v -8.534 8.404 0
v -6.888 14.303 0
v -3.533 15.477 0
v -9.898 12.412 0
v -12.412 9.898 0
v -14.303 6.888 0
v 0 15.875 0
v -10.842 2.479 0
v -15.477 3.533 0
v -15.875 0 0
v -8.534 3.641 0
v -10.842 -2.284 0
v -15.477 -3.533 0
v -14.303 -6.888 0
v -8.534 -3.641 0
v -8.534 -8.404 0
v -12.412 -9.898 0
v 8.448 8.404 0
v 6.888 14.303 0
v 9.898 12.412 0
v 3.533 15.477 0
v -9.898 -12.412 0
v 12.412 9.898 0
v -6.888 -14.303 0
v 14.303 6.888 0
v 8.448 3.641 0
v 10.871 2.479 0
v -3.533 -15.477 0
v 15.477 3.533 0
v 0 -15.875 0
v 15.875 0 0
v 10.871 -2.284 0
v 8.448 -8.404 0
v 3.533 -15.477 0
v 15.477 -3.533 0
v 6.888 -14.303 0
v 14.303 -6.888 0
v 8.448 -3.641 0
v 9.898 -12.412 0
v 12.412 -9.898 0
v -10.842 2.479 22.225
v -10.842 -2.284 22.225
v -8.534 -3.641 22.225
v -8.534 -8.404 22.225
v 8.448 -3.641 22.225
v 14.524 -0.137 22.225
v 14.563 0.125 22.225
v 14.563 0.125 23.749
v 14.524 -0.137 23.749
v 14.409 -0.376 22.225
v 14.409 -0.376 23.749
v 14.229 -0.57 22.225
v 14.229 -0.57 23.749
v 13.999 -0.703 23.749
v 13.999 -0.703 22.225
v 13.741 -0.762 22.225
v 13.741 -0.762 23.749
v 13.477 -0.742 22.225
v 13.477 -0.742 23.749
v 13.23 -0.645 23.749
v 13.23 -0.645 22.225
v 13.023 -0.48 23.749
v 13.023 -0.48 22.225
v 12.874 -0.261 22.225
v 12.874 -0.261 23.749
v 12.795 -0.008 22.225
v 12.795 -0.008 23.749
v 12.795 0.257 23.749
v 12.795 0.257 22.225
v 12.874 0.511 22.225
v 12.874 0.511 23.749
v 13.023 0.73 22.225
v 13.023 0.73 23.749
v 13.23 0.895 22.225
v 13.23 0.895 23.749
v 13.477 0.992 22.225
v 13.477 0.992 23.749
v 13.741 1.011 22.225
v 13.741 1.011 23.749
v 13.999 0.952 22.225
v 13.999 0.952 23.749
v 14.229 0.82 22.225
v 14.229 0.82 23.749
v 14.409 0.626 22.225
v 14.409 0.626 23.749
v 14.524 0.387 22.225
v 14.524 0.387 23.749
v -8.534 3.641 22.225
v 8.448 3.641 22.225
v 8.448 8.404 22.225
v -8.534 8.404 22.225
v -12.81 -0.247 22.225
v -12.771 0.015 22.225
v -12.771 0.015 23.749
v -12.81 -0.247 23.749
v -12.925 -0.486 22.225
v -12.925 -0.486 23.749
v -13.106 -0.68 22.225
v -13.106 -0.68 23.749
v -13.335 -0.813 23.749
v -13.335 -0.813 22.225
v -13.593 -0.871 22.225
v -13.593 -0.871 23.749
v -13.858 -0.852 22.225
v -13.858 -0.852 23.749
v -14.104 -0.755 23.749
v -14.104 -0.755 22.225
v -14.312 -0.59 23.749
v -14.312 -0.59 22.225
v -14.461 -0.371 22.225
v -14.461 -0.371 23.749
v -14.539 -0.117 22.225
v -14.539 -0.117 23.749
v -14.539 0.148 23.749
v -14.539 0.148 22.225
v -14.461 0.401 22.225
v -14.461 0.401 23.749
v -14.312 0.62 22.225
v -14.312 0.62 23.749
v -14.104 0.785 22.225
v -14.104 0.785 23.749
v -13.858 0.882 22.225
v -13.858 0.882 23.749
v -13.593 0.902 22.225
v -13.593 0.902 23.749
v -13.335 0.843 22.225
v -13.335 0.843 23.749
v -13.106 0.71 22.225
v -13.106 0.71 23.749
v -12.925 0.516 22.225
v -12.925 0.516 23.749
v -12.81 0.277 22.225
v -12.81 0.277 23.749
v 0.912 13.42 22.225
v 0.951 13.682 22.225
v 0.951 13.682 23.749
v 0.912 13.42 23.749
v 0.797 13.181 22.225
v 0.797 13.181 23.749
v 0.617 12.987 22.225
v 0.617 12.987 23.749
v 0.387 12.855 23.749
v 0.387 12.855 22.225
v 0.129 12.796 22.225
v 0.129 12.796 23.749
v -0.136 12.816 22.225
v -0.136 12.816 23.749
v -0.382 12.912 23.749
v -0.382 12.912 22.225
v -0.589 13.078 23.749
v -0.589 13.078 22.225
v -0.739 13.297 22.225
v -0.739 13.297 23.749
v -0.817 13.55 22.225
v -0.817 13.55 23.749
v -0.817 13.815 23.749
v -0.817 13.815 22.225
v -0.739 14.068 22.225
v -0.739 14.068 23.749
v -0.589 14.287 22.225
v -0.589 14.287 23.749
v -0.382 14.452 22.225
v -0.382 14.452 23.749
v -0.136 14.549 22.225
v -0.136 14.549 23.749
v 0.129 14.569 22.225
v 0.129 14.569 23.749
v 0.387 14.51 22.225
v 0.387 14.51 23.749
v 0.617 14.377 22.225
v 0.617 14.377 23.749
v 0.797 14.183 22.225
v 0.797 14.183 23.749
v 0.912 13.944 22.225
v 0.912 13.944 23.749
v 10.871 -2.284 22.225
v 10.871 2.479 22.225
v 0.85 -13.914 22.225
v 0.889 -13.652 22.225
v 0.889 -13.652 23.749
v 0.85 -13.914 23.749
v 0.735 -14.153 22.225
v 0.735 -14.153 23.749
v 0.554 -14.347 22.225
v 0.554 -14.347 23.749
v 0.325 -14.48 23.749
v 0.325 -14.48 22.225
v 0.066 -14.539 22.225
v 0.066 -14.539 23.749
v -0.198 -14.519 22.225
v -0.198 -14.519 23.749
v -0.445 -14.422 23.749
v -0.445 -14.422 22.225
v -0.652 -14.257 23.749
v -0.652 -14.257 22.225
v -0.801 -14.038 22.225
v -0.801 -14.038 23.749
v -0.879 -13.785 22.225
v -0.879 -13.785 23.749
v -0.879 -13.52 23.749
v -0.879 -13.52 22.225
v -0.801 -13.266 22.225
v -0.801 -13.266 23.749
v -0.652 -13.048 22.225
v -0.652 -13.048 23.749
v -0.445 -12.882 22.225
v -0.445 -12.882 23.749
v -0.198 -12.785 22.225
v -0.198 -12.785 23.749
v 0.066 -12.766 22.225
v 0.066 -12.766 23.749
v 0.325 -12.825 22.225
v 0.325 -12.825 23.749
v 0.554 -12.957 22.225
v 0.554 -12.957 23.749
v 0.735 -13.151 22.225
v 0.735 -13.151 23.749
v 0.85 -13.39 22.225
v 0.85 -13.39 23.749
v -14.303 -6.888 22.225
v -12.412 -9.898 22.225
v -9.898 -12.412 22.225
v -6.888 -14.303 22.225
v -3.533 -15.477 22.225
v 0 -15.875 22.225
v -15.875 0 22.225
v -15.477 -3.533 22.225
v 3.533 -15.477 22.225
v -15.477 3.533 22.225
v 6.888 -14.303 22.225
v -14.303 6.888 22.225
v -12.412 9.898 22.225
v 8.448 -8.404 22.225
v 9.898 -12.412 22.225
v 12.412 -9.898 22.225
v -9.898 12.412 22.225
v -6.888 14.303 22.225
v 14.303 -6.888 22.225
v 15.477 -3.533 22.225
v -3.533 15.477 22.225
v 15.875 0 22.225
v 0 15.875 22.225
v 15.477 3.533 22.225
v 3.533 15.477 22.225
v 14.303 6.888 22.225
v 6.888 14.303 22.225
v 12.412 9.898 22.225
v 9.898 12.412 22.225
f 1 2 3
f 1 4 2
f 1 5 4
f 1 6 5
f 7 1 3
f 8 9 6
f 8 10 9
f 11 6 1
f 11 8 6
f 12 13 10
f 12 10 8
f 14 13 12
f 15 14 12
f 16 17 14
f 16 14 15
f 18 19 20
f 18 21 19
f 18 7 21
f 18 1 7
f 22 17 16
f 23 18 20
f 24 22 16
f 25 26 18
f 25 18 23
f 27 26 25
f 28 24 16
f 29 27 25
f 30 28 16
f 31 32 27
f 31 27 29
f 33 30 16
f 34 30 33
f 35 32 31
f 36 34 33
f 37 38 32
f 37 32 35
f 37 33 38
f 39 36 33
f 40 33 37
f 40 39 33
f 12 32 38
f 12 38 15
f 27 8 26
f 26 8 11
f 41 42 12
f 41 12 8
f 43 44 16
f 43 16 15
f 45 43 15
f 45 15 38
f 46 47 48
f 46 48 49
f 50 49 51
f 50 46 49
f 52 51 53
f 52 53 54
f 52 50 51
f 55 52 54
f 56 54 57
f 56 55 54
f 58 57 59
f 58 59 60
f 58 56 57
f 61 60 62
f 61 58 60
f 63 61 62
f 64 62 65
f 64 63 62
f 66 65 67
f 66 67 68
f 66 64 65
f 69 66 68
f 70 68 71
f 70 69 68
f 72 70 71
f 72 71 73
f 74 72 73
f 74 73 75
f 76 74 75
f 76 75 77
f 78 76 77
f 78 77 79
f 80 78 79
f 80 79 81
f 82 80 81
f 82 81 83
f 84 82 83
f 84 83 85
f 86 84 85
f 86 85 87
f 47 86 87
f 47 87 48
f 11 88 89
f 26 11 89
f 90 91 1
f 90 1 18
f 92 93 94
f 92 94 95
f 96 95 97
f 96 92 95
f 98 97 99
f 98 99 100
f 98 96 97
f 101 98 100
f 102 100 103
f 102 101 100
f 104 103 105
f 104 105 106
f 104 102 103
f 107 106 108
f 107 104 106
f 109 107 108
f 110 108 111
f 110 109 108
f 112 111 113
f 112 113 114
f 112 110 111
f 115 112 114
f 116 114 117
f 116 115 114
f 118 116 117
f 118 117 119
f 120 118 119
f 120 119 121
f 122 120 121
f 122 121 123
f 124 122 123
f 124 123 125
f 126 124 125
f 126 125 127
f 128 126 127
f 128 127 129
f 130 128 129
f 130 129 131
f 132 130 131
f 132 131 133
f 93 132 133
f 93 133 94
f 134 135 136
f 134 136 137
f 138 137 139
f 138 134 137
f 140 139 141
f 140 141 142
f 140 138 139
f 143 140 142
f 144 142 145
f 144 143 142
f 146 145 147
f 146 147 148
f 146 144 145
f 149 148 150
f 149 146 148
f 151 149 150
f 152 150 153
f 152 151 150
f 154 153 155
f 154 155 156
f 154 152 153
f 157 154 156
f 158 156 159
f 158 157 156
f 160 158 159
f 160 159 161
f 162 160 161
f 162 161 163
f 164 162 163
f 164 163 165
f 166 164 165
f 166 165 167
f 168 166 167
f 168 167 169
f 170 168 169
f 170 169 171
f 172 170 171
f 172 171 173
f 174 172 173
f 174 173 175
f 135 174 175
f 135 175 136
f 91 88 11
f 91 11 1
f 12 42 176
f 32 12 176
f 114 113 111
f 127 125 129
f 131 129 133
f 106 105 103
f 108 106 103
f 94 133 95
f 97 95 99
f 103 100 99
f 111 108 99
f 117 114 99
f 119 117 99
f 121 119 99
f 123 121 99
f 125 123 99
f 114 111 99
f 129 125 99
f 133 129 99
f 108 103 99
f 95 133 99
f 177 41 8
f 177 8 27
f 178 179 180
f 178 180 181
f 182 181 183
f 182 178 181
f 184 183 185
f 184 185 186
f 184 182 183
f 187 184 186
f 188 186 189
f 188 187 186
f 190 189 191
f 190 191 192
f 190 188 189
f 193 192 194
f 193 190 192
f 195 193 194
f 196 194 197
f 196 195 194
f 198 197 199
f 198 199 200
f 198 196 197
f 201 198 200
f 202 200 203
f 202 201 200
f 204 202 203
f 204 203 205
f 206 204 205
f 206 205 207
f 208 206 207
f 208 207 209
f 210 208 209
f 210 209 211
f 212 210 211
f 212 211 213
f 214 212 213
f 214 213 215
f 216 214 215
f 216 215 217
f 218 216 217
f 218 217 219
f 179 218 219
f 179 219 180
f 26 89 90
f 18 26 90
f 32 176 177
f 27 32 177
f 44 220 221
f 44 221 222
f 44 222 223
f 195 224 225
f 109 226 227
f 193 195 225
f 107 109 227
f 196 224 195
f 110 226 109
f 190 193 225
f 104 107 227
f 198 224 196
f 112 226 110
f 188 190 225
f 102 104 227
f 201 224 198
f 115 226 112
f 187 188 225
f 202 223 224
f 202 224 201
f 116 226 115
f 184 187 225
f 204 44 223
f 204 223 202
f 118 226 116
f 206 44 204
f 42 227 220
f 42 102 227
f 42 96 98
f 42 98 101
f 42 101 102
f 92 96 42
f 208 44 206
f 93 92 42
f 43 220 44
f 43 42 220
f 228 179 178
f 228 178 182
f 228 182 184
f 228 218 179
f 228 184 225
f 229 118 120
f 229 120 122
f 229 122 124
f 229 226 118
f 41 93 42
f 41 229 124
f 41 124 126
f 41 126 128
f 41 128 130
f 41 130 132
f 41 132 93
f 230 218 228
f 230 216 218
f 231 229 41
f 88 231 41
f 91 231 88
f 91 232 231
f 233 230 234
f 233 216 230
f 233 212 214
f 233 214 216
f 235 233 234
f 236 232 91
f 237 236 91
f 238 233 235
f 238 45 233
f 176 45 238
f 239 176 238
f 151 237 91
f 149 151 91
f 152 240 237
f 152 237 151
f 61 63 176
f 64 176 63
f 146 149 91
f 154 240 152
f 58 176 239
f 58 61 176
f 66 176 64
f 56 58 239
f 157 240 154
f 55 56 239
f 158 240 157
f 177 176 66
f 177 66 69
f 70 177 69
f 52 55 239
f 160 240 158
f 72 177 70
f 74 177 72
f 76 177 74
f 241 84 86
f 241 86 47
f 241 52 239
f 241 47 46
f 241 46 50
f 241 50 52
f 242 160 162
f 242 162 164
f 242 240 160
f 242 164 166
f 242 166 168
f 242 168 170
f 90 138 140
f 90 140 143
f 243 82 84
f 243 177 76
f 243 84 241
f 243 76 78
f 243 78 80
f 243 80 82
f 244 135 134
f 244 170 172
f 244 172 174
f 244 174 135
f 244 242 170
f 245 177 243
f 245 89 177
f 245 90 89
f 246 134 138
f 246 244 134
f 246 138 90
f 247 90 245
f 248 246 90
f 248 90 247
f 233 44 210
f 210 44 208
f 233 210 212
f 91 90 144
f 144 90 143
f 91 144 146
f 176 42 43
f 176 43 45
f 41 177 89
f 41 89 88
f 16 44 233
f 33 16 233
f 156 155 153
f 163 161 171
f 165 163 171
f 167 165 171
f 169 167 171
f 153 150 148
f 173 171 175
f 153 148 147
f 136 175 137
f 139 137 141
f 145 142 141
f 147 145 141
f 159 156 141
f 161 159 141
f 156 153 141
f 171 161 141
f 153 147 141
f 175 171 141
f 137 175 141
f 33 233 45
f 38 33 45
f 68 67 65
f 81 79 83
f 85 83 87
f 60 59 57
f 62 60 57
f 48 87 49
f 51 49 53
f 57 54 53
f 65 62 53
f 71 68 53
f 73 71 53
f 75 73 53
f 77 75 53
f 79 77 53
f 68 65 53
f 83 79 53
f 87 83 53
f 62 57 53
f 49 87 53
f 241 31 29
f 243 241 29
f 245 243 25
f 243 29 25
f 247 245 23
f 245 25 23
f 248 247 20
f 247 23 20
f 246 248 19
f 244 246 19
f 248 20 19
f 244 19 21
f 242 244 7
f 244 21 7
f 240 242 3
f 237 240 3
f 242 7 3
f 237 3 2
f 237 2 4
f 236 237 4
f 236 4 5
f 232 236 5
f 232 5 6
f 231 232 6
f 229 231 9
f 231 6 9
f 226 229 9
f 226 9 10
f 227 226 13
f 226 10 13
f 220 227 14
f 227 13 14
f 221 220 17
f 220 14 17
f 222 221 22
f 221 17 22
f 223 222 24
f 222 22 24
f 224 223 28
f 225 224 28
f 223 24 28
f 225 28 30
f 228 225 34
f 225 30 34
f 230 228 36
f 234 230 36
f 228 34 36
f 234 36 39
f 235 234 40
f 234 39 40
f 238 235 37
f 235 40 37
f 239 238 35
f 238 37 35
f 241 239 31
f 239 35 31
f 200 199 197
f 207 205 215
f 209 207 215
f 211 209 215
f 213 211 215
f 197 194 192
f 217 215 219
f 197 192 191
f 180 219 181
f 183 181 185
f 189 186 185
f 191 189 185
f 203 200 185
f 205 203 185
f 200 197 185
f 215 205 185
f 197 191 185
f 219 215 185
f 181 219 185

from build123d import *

# Parameters (mm, degrees)
F0_R     = 15.875
F1_DEPTH = 22.225
F3_R     = 0.889
F5_DEPTH = 23.749
F9_W     = 21.712904
F9_H     = 4.7625
F7_DEPTH = 22.225
F6_W     = 16.982072
F6_H     = 4.7625
F8_DEPTH = 22.225


with BuildPart() as f1:
    # F0 (on Top) → F1 (new body)
    with BuildSketch(Plane.XY):
        Circle(F0_R)
    extrude(amount=F1_DEPTH)

    # F3 (on face) → F5 (join)
    with BuildSketch(Plane(origin=(0, 0, 0), x_dir=(1, 0, 0), z_dir=(0, 0, -1))):
        with Locations((0, 13.652203)):
            Circle(F3_R)
        with Locations((-13.659894, -0.015021)):
            Circle(F3_R)
        with Locations((0.062219, -13.682245)):
            Circle(F3_R)
        with Locations((13.674476, -0.124876)):
            Circle(F3_R)
    extrude(amount=-F5_DEPTH)

    # F9 (on face) → F7 (cut)
    with BuildSketch(Plane.XY.offset(22.225)):
        with Locations((0.014928, 0.097281)):
            Rectangle(F9_W, F9_H)
    extrude(amount=-F7_DEPTH, mode=Mode.SUBTRACT)

    # F6 (on face) → F8 (cut)
    with BuildSketch(Plane.XY.offset(22.225)):
        with Locations((-0.042667, 6.022512)):
            Rectangle(F6_W, F6_H)
        with Locations((-0.042667, -6.022512)):
            Rectangle(F6_W, F6_H)
    extrude(amount=-F8_DEPTH, mode=Mode.SUBTRACT)


solid = f1.part
